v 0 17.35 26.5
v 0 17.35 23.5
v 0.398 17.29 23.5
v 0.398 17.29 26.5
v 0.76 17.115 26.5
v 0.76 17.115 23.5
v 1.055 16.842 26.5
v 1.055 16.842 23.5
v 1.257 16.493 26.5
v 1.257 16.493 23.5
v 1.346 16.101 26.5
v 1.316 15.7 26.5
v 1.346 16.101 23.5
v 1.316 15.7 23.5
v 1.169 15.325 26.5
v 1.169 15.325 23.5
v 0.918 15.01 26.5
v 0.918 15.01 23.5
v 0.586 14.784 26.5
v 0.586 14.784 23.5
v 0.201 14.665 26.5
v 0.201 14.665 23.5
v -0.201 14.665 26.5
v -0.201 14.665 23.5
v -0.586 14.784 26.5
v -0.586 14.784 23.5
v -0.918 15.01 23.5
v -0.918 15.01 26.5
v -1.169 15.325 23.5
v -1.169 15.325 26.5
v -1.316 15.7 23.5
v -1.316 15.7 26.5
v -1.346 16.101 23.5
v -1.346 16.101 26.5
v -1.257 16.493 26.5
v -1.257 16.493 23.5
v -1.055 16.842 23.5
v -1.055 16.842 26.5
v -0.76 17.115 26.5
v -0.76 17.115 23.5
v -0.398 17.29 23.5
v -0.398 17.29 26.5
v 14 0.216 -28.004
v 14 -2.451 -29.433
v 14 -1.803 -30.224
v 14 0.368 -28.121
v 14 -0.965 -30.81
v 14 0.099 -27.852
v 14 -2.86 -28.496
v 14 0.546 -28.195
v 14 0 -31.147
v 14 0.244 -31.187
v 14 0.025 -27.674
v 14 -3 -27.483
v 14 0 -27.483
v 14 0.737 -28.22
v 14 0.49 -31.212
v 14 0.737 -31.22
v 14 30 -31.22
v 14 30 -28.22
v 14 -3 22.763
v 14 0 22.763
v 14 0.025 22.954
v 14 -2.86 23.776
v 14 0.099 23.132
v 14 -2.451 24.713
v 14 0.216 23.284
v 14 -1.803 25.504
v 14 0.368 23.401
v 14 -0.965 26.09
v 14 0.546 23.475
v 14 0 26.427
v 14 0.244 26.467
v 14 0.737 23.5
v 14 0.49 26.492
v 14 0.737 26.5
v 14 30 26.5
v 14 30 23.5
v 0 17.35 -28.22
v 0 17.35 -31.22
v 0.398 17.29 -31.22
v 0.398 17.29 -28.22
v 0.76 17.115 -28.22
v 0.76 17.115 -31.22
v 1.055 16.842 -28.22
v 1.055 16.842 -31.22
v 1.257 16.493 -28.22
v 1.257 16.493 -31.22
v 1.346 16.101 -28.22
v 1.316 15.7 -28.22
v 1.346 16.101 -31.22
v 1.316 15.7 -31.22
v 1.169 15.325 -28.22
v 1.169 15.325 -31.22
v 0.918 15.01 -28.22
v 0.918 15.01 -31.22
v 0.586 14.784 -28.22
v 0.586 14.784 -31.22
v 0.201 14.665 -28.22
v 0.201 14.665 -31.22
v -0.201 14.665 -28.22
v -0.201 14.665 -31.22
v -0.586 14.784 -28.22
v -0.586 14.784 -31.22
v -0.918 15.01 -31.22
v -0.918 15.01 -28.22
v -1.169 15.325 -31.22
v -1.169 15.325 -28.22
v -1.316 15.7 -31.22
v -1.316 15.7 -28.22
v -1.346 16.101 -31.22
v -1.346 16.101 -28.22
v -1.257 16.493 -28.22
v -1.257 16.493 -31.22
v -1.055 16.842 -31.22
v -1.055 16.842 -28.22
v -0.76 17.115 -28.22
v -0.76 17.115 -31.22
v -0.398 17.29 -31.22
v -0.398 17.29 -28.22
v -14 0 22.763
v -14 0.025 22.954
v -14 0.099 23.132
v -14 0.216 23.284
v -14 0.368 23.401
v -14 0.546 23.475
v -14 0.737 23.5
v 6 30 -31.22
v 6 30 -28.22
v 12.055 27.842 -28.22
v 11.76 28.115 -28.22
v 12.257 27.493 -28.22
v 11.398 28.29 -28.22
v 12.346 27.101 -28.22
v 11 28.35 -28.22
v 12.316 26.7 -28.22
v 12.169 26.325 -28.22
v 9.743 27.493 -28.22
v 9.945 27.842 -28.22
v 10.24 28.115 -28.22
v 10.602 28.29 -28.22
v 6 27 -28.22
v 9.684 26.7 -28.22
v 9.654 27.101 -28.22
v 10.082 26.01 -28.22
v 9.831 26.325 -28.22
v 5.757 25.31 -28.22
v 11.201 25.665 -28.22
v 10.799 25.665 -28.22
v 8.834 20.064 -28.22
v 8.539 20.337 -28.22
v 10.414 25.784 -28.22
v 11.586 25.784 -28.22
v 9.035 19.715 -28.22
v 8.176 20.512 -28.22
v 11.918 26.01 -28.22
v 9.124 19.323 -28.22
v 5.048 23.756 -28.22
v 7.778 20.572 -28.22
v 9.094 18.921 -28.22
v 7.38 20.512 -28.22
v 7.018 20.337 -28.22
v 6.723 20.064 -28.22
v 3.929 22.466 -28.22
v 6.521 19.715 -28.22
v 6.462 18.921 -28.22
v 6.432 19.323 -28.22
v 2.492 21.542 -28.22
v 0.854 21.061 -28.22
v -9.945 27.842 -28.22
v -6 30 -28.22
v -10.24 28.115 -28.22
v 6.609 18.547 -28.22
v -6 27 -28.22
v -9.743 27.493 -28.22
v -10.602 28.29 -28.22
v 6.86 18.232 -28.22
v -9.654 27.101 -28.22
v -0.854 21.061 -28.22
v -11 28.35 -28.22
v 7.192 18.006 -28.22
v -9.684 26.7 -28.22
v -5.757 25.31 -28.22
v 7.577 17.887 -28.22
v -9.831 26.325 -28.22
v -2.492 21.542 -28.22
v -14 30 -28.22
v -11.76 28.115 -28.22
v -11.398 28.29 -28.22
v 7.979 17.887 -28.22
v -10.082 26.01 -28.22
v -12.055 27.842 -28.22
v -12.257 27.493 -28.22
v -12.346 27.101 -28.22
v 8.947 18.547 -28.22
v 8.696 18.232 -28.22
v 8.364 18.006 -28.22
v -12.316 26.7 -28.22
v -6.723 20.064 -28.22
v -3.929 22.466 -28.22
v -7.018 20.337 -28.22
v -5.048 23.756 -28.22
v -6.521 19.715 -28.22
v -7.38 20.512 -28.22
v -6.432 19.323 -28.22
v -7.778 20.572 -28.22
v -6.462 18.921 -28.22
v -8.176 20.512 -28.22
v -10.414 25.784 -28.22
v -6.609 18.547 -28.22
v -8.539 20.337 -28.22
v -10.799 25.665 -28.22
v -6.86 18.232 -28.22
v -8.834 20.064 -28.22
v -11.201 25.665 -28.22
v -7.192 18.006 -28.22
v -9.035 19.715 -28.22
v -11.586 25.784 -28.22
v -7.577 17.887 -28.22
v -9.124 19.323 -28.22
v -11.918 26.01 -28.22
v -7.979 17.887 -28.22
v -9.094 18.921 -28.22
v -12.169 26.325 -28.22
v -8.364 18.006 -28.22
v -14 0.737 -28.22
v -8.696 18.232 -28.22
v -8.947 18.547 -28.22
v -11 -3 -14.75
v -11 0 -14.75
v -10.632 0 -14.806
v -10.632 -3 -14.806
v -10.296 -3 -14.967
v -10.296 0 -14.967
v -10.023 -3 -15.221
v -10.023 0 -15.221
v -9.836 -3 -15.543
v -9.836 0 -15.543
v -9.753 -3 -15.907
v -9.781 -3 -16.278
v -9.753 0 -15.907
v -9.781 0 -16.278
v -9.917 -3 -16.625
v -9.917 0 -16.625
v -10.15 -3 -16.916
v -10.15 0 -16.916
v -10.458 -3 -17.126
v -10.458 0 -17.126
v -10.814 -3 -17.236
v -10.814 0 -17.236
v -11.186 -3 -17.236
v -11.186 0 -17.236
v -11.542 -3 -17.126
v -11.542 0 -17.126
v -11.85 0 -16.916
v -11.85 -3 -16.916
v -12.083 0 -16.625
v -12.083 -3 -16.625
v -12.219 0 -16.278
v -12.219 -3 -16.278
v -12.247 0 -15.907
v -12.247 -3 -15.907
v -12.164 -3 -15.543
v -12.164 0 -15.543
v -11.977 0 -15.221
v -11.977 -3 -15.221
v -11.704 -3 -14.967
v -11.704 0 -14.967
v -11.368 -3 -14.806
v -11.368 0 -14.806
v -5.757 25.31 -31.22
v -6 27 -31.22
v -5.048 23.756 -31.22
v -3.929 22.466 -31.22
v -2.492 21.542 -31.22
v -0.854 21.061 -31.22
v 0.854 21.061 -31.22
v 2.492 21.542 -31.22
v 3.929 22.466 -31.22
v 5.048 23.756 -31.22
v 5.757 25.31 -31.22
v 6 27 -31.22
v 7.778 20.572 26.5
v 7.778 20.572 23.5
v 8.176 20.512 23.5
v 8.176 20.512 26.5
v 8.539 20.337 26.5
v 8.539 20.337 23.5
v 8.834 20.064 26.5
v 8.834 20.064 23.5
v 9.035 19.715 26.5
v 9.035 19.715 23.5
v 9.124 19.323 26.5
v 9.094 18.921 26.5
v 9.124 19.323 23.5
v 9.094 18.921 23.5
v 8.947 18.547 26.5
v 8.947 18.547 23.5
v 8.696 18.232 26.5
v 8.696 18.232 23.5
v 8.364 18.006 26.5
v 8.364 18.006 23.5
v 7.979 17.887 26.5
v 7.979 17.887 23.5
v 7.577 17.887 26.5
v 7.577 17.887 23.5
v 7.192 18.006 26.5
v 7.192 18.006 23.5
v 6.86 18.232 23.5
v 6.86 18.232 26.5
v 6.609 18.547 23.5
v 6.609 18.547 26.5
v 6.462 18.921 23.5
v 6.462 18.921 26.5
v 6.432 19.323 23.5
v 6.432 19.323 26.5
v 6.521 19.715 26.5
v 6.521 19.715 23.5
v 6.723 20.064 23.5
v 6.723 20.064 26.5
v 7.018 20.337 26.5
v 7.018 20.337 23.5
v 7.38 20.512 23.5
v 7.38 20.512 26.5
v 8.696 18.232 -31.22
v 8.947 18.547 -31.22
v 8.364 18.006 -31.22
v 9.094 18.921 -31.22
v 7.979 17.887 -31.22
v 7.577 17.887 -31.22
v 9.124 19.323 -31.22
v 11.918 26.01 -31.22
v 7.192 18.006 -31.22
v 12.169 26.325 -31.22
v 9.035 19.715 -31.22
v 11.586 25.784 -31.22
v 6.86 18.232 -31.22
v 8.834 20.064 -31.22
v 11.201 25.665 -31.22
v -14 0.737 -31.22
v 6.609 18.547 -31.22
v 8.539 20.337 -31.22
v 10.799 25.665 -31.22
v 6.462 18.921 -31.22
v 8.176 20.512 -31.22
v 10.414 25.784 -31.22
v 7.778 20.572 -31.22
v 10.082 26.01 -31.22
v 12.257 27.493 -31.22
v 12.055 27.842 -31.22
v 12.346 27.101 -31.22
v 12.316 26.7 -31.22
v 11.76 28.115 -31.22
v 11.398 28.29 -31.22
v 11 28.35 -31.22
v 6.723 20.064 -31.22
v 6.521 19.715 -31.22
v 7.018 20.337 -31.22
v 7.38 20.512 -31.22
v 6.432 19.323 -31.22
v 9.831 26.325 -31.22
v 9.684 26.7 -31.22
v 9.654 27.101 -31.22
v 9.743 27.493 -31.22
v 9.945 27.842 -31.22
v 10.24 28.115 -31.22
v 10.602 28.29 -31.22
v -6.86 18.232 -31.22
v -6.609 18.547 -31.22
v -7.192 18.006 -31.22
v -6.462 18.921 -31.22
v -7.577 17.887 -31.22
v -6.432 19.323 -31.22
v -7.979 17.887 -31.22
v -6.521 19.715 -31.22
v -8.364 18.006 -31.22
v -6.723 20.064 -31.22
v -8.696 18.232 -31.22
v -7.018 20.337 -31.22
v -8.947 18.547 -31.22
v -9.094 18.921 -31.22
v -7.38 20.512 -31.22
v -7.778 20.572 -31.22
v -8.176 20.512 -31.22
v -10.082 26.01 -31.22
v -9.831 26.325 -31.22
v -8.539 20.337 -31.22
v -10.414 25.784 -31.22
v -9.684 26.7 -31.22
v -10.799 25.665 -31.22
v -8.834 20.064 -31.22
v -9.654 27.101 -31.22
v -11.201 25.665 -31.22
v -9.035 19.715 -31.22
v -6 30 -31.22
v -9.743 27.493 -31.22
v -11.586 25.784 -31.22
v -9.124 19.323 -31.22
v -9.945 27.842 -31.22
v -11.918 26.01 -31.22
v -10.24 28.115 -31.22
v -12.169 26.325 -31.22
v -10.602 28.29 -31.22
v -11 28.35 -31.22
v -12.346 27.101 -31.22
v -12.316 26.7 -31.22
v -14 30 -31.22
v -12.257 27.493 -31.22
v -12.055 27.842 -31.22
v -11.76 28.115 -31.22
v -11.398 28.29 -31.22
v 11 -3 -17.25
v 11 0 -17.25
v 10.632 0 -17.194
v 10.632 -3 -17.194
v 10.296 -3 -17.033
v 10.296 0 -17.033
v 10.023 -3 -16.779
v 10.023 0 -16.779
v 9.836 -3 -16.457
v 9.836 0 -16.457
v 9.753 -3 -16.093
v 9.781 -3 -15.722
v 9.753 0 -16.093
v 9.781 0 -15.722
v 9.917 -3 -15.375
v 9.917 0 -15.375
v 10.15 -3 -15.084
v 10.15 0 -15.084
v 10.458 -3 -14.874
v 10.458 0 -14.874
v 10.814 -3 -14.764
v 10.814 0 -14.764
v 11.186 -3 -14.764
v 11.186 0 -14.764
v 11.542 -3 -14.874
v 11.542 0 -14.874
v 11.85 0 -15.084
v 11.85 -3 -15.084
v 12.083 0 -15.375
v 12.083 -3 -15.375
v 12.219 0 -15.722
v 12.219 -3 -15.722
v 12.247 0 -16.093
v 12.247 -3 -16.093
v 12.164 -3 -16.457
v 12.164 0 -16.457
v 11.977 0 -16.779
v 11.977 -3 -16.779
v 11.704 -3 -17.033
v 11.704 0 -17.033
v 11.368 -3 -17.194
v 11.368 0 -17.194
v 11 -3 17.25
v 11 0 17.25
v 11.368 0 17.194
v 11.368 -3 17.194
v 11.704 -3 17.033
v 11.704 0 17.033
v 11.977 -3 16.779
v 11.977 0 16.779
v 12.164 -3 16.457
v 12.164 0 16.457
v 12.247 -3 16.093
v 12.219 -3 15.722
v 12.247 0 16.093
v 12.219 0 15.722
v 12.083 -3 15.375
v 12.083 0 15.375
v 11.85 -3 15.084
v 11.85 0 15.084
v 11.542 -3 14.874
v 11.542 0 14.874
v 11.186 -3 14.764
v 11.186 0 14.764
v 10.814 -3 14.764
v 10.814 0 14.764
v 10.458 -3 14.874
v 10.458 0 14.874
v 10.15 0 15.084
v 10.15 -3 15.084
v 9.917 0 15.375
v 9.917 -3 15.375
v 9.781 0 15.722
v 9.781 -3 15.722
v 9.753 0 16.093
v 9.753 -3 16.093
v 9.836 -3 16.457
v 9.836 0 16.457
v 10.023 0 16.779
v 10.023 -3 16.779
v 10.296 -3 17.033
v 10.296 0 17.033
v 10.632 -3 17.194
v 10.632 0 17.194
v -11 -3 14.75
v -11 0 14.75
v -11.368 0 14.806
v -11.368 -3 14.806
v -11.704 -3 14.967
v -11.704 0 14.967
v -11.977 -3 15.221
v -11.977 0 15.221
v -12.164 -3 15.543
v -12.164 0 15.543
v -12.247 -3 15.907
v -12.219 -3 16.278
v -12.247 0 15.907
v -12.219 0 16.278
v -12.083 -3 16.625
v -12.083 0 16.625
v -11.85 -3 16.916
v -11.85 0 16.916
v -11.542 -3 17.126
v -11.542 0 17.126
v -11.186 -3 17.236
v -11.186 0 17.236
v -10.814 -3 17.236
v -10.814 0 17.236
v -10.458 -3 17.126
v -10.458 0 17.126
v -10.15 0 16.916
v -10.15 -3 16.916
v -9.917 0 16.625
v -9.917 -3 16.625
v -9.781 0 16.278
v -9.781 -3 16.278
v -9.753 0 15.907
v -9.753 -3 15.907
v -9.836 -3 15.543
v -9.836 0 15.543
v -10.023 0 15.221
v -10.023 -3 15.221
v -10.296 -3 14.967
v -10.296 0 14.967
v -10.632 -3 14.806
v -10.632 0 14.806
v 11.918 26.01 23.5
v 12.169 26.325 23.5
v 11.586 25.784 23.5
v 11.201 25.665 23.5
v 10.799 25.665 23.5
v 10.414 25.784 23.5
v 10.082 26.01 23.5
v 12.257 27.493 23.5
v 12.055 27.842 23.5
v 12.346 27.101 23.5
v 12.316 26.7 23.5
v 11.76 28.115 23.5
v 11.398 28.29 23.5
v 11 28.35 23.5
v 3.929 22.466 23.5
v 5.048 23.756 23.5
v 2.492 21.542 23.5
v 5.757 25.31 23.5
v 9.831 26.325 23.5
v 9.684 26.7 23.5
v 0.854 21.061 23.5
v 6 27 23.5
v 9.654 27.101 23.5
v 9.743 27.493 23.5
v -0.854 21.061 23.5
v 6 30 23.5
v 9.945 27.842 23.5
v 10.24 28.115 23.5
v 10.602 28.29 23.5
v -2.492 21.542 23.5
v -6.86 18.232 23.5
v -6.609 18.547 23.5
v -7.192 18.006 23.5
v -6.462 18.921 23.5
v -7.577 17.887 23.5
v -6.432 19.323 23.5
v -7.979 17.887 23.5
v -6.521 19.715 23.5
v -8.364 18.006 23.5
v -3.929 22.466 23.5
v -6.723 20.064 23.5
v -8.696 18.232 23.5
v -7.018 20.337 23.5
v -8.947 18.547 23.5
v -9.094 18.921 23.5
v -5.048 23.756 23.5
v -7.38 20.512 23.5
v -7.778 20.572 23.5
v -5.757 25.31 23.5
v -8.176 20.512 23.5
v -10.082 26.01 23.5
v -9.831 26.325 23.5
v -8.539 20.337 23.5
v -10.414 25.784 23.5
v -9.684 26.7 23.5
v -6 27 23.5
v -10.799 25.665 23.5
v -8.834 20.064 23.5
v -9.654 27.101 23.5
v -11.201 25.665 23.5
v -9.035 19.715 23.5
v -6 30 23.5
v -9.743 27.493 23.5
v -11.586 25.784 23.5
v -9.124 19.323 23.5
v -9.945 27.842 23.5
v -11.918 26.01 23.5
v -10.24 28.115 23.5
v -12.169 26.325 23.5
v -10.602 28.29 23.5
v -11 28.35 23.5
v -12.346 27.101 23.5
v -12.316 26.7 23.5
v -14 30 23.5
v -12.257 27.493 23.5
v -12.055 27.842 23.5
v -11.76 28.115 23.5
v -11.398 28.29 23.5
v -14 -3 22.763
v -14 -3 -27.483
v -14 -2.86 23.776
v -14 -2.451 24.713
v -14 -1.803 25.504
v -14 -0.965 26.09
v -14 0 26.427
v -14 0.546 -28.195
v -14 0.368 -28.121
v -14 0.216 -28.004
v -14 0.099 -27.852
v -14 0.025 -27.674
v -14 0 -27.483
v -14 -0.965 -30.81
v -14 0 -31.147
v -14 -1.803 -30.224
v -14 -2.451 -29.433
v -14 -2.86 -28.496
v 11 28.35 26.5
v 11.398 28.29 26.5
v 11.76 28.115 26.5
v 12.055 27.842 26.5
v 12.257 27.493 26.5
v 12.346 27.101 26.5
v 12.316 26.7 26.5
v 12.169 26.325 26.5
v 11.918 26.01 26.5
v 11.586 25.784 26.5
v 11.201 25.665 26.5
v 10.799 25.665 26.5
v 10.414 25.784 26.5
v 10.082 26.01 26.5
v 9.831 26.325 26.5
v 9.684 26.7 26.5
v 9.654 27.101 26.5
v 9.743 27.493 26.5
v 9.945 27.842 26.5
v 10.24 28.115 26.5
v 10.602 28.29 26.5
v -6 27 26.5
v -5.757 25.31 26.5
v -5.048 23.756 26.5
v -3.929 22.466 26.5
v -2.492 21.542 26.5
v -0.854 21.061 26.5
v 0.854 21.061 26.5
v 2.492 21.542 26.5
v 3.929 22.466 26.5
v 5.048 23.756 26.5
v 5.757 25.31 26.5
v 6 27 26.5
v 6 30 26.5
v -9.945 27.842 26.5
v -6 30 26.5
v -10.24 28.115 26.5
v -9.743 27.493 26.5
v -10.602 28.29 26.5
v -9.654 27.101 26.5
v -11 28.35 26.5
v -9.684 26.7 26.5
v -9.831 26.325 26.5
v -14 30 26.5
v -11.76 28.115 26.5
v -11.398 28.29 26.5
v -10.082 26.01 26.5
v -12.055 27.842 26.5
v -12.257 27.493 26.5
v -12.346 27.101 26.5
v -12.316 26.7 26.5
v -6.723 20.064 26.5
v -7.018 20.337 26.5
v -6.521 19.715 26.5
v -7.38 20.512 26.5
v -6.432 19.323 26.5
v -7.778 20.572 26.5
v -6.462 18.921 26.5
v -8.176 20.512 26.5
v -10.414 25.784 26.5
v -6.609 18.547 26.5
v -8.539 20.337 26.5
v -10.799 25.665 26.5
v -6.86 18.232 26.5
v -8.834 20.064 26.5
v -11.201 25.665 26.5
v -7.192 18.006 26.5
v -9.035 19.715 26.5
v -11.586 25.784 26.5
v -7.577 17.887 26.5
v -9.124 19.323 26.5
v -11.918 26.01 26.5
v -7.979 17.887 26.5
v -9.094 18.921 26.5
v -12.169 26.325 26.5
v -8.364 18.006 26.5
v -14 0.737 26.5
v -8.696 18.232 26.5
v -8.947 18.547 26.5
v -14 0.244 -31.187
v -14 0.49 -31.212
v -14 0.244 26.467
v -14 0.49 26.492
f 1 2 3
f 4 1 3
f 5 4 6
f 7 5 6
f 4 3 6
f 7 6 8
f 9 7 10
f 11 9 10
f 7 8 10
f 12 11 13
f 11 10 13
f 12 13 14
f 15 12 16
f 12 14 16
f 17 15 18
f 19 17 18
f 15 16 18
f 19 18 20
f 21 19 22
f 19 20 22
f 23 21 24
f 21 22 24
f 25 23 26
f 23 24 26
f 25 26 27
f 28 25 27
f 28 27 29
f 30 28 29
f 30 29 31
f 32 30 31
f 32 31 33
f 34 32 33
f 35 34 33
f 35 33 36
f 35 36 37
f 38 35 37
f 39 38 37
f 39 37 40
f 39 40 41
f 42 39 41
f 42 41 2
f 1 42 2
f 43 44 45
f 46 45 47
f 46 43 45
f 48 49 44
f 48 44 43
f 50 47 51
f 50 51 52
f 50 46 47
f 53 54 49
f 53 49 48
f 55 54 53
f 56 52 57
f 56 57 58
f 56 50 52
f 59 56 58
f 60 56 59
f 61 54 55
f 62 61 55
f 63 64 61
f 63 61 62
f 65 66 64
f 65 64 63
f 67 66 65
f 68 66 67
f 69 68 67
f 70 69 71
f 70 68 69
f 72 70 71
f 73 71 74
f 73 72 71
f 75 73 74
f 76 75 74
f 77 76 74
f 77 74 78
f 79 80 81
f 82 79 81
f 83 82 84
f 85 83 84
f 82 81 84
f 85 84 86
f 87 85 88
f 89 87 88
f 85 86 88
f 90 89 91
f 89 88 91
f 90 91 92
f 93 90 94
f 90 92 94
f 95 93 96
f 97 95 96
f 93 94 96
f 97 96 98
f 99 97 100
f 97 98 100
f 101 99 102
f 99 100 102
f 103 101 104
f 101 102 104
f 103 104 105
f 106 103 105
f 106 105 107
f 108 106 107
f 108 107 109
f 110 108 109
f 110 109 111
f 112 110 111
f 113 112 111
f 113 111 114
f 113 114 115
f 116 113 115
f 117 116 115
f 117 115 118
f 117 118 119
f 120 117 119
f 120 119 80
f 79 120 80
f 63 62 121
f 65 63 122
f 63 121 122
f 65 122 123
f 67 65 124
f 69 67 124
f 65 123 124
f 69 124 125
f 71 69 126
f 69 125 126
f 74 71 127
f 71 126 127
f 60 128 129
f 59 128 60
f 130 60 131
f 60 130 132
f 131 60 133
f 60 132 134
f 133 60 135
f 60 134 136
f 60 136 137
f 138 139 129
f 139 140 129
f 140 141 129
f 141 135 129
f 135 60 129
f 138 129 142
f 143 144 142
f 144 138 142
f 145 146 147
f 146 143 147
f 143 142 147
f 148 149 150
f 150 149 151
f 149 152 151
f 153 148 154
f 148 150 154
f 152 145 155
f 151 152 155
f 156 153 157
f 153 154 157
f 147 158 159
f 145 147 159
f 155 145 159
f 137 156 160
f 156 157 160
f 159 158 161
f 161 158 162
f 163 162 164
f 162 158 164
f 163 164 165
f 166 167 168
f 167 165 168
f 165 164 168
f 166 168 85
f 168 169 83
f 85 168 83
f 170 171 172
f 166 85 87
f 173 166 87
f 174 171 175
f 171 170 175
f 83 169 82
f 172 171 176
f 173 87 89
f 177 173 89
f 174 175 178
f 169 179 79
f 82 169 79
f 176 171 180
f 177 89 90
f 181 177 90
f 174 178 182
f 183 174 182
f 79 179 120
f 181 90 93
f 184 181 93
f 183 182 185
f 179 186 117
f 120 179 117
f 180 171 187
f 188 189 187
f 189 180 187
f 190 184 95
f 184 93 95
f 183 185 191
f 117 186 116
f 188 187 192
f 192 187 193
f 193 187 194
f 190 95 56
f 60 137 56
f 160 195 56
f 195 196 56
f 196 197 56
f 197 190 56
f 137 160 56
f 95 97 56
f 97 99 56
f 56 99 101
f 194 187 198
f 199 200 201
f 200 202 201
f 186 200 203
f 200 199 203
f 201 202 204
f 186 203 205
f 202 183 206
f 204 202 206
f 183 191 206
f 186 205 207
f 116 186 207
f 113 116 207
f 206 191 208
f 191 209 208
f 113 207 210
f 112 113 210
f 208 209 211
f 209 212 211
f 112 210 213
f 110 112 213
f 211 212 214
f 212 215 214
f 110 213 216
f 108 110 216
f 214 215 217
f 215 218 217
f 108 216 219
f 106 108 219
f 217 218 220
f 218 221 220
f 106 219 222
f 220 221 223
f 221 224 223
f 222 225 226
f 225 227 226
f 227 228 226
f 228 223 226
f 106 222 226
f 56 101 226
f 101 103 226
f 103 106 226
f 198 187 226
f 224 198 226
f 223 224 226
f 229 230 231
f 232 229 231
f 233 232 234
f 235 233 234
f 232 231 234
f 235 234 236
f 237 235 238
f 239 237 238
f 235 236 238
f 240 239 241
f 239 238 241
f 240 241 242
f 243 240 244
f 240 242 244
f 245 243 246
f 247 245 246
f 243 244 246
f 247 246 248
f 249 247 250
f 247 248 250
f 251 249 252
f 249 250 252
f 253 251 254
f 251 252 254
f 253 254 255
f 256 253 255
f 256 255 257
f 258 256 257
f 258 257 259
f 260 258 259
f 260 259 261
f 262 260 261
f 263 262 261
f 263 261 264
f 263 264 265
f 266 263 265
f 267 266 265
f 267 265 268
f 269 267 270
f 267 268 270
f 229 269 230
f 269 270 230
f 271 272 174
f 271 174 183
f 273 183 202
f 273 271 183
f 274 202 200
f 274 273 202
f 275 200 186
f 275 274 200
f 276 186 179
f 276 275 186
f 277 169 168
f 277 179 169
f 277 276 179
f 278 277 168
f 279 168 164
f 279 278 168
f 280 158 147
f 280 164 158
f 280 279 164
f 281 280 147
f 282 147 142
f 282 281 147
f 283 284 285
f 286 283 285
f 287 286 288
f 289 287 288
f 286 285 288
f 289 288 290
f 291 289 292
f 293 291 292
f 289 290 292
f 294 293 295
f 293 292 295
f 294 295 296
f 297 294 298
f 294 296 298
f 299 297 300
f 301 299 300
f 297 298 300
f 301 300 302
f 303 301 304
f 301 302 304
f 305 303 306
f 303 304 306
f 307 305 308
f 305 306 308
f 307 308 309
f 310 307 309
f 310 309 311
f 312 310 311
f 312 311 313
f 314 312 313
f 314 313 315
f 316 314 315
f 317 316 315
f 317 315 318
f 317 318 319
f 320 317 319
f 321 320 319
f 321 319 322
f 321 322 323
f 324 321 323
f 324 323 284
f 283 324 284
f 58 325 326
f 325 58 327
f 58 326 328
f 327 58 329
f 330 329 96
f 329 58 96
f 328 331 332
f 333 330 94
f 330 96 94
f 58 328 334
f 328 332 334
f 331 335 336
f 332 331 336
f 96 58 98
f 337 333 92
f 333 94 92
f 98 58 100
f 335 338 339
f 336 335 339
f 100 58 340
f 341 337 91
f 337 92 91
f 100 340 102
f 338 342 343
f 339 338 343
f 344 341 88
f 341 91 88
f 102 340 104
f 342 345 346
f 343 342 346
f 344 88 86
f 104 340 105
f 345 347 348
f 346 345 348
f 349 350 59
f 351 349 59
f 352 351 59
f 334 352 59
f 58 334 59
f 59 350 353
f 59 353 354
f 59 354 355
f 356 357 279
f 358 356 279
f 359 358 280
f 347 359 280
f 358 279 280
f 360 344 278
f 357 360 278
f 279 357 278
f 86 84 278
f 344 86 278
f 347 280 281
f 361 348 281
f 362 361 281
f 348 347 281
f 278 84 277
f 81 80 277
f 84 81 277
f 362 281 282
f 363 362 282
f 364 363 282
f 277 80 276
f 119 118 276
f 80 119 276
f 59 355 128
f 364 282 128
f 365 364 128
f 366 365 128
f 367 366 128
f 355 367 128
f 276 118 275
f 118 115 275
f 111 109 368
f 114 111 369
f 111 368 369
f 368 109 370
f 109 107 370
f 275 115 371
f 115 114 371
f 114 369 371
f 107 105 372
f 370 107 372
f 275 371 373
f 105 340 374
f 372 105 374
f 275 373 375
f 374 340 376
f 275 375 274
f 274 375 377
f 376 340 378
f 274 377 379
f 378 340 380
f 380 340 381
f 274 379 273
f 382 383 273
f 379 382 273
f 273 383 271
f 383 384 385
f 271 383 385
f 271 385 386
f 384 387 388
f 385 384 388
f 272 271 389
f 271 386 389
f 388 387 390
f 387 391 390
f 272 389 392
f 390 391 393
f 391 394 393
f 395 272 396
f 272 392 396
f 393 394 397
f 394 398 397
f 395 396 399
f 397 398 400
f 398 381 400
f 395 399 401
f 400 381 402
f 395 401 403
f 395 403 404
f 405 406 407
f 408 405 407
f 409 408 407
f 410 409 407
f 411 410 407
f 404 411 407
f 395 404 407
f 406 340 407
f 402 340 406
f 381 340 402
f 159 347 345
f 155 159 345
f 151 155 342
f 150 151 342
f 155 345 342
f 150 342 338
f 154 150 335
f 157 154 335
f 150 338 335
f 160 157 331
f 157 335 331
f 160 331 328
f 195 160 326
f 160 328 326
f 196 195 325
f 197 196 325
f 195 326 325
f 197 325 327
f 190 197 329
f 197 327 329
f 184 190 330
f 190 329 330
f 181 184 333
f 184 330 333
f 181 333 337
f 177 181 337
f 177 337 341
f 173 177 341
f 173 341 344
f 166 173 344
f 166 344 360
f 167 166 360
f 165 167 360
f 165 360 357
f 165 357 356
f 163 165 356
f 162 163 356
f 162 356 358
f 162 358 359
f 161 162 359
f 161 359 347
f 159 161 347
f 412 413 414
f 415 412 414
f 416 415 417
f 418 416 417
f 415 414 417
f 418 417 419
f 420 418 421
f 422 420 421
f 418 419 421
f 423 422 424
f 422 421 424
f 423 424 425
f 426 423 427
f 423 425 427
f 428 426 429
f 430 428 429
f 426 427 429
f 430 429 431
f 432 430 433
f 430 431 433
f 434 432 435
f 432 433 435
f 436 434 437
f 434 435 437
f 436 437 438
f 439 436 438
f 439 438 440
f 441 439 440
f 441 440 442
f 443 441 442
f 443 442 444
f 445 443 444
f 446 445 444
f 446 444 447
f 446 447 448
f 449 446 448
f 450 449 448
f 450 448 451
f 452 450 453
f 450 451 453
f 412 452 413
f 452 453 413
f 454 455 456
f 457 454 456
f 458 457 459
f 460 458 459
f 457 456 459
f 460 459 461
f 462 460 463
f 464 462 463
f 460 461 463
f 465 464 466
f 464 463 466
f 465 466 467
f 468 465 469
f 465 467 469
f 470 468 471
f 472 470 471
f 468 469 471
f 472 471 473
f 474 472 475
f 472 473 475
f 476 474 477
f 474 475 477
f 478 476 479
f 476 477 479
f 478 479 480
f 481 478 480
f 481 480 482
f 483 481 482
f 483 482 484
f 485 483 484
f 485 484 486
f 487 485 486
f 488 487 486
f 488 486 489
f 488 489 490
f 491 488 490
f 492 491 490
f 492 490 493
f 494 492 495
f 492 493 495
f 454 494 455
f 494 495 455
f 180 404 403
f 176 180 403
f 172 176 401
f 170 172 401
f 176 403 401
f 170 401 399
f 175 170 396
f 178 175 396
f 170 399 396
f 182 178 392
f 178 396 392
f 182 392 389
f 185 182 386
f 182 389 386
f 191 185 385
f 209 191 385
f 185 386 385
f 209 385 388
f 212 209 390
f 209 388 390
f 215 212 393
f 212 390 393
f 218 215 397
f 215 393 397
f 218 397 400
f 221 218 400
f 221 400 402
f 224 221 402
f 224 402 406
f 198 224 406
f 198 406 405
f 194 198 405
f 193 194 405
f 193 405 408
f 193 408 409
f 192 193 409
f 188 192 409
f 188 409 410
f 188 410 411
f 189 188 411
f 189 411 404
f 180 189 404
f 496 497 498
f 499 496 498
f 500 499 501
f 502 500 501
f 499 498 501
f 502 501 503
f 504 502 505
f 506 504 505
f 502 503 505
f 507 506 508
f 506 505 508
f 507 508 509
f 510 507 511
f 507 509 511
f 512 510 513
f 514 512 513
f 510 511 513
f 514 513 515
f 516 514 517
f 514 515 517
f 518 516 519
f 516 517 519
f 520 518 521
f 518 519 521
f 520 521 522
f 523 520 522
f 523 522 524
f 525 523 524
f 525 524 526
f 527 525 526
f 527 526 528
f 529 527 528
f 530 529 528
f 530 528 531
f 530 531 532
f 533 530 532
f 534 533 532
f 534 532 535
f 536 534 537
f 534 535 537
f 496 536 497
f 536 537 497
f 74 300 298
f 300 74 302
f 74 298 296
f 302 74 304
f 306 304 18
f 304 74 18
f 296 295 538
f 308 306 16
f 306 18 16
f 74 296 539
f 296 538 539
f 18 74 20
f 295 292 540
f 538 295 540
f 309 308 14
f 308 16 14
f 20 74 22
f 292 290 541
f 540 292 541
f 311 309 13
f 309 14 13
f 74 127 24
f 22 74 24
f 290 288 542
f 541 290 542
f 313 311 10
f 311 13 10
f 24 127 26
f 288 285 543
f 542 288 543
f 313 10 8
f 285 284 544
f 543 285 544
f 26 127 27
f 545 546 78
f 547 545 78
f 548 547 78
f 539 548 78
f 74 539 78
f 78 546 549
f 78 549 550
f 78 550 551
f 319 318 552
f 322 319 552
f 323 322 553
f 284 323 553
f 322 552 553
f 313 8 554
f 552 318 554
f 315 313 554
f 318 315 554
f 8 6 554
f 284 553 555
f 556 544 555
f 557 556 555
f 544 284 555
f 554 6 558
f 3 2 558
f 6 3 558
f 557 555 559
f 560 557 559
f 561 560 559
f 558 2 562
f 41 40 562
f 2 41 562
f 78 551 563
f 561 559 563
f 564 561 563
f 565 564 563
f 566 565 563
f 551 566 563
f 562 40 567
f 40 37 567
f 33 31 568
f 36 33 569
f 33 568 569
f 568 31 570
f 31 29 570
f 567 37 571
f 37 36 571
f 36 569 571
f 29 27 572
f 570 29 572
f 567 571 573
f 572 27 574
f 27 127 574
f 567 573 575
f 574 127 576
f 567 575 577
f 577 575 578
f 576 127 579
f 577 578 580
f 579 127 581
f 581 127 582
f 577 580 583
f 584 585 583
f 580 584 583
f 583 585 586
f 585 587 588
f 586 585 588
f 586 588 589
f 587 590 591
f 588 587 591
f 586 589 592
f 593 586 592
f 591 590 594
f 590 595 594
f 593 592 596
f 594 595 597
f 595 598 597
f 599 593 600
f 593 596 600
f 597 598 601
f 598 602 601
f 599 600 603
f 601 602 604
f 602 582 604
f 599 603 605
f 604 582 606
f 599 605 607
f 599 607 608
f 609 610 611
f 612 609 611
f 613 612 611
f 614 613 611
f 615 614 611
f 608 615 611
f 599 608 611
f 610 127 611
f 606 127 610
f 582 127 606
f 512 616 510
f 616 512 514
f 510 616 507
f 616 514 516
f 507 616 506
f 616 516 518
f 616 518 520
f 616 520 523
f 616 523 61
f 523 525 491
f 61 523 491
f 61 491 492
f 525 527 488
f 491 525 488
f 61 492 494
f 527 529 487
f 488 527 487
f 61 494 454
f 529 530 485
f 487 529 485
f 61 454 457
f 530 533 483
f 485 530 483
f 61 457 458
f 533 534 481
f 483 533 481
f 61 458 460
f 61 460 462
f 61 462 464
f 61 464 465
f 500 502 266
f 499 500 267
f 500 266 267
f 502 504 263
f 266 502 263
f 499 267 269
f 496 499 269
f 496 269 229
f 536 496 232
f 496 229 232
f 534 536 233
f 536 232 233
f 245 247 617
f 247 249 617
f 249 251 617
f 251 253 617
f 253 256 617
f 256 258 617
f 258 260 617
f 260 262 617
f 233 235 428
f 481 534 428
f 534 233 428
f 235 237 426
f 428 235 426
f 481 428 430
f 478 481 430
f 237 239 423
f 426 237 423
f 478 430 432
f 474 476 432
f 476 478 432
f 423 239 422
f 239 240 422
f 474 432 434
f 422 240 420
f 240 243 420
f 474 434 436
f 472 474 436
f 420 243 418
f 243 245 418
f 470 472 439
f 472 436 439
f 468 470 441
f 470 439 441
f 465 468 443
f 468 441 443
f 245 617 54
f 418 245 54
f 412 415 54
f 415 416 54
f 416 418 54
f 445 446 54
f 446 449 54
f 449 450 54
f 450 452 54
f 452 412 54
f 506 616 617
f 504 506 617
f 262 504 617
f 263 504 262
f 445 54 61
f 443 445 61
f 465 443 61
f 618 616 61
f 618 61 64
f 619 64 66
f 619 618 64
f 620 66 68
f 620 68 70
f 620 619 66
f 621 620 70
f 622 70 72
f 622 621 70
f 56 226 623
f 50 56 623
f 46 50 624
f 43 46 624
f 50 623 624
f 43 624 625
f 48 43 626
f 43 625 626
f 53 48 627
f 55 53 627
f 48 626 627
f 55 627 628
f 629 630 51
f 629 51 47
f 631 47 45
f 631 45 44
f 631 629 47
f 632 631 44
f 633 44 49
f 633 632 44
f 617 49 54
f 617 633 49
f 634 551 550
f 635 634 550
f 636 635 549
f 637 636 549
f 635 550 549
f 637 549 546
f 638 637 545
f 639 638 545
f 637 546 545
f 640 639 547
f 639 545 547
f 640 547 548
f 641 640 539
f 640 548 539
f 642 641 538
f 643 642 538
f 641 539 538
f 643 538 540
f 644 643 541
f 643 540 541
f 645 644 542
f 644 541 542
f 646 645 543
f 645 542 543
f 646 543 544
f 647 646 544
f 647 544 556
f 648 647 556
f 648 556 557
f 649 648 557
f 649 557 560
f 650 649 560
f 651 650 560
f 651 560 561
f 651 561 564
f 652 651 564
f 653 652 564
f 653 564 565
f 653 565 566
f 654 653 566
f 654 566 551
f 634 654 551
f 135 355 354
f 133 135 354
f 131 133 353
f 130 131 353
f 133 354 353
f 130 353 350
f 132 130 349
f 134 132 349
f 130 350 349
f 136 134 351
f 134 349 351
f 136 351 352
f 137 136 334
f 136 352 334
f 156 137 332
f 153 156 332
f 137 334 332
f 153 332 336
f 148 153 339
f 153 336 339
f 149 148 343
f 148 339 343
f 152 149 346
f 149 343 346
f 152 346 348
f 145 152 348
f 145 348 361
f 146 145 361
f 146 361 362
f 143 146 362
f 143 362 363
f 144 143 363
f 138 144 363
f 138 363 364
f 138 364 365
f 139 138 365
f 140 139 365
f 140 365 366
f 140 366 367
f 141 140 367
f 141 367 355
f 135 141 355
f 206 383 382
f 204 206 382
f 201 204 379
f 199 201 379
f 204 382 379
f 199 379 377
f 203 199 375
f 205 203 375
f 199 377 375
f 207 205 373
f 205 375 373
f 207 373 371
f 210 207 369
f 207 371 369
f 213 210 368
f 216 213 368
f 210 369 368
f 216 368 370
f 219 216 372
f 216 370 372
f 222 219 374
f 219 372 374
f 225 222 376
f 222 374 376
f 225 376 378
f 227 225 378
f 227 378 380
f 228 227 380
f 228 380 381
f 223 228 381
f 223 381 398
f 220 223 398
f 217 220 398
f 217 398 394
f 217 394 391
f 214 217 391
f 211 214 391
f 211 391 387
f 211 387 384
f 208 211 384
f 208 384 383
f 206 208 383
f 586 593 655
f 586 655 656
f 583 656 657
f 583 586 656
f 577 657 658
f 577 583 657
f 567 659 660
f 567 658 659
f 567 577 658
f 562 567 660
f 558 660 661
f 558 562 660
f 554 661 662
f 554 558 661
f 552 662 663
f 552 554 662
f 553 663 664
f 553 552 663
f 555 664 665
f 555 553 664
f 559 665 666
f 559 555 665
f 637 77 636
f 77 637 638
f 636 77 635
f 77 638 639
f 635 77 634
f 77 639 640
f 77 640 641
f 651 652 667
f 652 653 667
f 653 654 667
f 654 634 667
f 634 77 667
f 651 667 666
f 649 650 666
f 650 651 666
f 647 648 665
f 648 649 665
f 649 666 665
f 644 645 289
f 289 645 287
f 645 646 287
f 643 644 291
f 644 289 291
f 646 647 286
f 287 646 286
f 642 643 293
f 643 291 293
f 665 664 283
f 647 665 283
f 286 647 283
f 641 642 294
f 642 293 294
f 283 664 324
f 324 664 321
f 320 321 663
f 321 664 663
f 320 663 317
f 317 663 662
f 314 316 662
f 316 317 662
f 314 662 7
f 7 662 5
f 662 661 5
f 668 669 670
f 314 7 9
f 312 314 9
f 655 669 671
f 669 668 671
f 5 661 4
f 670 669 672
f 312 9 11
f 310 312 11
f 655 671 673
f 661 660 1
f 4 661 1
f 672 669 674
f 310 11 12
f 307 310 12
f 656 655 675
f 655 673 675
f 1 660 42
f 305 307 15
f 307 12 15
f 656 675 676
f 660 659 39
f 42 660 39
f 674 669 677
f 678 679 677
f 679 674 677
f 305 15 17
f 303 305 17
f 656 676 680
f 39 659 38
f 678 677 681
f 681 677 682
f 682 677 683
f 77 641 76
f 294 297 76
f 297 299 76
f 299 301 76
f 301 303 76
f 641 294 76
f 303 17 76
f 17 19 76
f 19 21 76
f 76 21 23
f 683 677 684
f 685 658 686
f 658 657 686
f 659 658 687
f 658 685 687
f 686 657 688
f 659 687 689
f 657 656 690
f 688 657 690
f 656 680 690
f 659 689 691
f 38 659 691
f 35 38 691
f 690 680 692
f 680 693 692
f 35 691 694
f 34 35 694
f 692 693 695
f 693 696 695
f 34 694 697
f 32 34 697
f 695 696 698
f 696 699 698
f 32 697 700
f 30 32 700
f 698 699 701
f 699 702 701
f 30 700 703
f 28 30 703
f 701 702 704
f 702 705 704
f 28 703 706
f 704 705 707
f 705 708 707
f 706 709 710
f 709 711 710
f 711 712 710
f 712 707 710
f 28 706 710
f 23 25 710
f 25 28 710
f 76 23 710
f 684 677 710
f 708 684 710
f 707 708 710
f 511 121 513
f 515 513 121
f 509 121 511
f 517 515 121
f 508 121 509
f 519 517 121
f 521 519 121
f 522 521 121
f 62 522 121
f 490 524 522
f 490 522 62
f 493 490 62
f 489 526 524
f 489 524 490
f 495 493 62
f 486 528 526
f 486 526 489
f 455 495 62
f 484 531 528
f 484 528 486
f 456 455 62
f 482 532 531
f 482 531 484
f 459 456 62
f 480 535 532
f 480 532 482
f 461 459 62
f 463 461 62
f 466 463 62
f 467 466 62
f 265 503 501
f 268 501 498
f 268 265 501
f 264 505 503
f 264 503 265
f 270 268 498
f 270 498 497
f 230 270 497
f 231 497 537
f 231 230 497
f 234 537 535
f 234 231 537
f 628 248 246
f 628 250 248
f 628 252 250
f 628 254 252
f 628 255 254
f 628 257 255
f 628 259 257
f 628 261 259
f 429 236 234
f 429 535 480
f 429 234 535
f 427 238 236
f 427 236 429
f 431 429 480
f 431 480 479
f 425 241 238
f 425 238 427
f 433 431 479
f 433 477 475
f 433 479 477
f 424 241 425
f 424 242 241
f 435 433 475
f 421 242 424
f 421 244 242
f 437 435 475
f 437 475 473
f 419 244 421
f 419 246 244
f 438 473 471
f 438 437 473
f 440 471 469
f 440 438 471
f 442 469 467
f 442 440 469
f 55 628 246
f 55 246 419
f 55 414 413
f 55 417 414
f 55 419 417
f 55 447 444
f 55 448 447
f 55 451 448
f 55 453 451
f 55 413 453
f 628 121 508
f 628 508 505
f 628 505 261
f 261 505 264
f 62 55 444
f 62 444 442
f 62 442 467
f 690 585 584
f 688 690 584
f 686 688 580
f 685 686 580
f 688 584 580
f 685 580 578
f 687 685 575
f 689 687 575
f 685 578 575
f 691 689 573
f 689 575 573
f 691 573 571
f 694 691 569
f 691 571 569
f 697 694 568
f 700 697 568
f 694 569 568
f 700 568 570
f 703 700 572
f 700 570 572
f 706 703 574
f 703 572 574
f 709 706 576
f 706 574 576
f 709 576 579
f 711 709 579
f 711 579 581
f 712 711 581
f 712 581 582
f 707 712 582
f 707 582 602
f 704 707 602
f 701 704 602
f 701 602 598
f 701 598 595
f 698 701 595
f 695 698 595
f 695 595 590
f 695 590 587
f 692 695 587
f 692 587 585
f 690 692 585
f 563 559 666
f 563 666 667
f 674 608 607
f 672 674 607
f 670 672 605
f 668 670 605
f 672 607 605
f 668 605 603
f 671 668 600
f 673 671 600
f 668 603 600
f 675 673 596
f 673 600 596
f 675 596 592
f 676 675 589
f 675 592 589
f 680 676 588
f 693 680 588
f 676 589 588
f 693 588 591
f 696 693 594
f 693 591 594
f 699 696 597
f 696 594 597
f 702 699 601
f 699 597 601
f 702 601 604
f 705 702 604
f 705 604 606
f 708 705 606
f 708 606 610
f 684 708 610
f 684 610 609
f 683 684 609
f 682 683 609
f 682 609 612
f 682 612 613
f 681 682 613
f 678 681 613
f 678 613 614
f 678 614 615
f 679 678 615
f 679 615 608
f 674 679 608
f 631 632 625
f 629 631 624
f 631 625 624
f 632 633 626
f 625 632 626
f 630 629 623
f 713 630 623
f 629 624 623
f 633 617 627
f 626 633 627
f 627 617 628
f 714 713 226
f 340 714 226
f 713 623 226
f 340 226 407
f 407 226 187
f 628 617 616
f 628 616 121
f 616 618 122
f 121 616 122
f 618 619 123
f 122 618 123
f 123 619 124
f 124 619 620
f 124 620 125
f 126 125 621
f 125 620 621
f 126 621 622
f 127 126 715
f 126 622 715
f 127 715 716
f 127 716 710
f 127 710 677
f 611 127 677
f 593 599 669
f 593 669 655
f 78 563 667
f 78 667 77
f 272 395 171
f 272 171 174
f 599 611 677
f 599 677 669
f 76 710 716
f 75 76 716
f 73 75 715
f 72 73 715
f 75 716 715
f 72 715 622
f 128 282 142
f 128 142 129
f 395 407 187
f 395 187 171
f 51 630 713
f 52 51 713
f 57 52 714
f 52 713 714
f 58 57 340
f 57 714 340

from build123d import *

# Parameters (mm, degrees)
SKETCH_1_W             = 28
SKETCH_1_H             = 160
SKETCH_1_R             = 1.25
SM_BASE_FLANGE_1_DEPTH = 3
OTHER_START            = -14
OTHER_1_DEPTH          = 28
OTHER_1_2_DEPTH        = 28
SKETCH_7_R             = 1.35
CUT_EXTRUDE_1_DEPTH    = 81.582164958


# Read off the part's stored shape, not the designer's step: 绘制的折弯1
# Sheet-metal steps are written as plain solids
with BuildPart() as part:
    # Sketch 1 → 基体-法兰1 (new body)
    with BuildSketch(Plane(origin=(0, 0, 0), x_dir=(1, 0, 0), z_dir=(0, 1, 0))):
        Rectangle(SKETCH_1_W, SKETCH_1_H)
        with Locations(Location((-11, -16, 0), (0, 0, 90))):
            Circle(SKETCH_1_R, mode=Mode.SUBTRACT)
        with Locations(Location((11, -16, 0), (0, 0, 270))):
            Circle(SKETCH_1_R, mode=Mode.SUBTRACT)
        with Locations(Location((11, 16, 0), (0, 0, 90))):
            Circle(SKETCH_1_R, mode=Mode.SUBTRACT)
        with Locations(Location((-11, 16, 0), (0, 0, 270))):
            Circle(SKETCH_1_R, mode=Mode.SUBTRACT)
    extrude(amount=-SM_BASE_FLANGE_1_DEPTH)

    # Other 1 outline → Other 1 (cut)
    with BuildSketch(Plane.YZ.offset(OTHER_START)):
        with BuildLine():
            ThreePointArc((0, -31.146677222), (-2.154295979, -29.850867001), (-3, -27.4834))
            Line((-3, -27.4834), (-3, -80))
            Line((-3, -80), (0, -80))
            Line((0, -80), (0, -31.146677222))
        make_face()
        with BuildLine():
            Line((-3, 80), (-3, 22.7634))
            ThreePointArc((-3, 22.7634), (-2.154295979, 25.130867001), (0, 26.426677222))
            Line((0, 26.426677222), (0, 80))
            Line((0, 80), (-3, 80))
        make_face()
    extrude(amount=OTHER_1_DEPTH, mode=Mode.SUBTRACT)

    # Other 1 2 outline → Other 1 2 (add)
    with BuildSketch(Plane.YZ.offset(OTHER_START)):
        with BuildLine():
            Line((0, -27.4834), (0, -31.146677222))
            ThreePointArc((0, -31.146677222), (0.36647982, -31.201624121), (0.7366, -31.22))
            Line((0.7366, -31.22), (49.739956935, -31.22))
            Line((49.739956935, -31.22), (49.739956935, -28.22))
            Line((49.739956935, -28.22), (0.7366, -28.22))
            ThreePointArc((0.7366, -28.22), (0.215745145, -28.004254855), (0, -27.4834))
        make_face()
        with BuildLine():
            ThreePointArc((0.7366, 26.5), (0.36647982, 26.481624121), (0, 26.426677222))
            Line((0, 26.426677222), (0, 22.7634))
            ThreePointArc((0, 22.7634), (0.215745145, 23.284254855), (0.7366, 23.5))
            Line((0.7366, 23.5), (54.459956935, 23.5))
            Line((54.459956935, 23.5), (54.459956935, 26.5))
            Line((54.459956935, 26.5), (0.7366, 26.5))
        make_face()
    extrude(amount=OTHER_1_2_DEPTH)

    # Sketch 7 → 切除-拉伸1 (cut, through all)
    with BuildSketch(Plane(origin=(0, 0, -31.22), x_dir=(-1, 0, 0), z_dir=(0, 0, -1))):
        with Locations(Location((11, 27, 0), (0, 0, 90))):
            Circle(SKETCH_7_R)
        with Locations(Location((7.778174593, 19.221825407, 0), (0, 0, 90))):
            Circle(SKETCH_7_R)
        with Locations(Location((0, 16, 0), (0, 0, 90))):
            Circle(SKETCH_7_R)
        with Locations(Location((-7.778174593, 19.221825407, 0), (0, 0, 90))):
            Circle(SKETCH_7_R)
        with Locations(Location((-11, 27, 0), (0, 0, 90))):
            Circle(SKETCH_7_R)
        with BuildLine():
            Line((-14, 27), (-32.703539992, 27))
            Line((-32.703539992, 27), (-27.737483214, 57.366036836))
            Line((-27.737483214, 57.366036836), (24.538070134, 57.366036836))
            Line((24.538070134, 57.366036836), (24.538070134, 27))
            Line((24.538070134, 27), (14, 27))
            Line((14, 27), (14, 30))
            Line((14, 30), (6, 30))
            Line((6, 30), (6, 27))
            ThreePointArc((6, 27), (0, 21), (-6, 27))
            Line((-6, 27), (-6, 30))
            Line((-6, 30), (-14, 30))
            Line((-14, 30), (-14, 27))
        make_face()
    extrude(amount=-CUT_EXTRUDE_1_DEPTH, mode=Mode.SUBTRACT)


solid = part.part
